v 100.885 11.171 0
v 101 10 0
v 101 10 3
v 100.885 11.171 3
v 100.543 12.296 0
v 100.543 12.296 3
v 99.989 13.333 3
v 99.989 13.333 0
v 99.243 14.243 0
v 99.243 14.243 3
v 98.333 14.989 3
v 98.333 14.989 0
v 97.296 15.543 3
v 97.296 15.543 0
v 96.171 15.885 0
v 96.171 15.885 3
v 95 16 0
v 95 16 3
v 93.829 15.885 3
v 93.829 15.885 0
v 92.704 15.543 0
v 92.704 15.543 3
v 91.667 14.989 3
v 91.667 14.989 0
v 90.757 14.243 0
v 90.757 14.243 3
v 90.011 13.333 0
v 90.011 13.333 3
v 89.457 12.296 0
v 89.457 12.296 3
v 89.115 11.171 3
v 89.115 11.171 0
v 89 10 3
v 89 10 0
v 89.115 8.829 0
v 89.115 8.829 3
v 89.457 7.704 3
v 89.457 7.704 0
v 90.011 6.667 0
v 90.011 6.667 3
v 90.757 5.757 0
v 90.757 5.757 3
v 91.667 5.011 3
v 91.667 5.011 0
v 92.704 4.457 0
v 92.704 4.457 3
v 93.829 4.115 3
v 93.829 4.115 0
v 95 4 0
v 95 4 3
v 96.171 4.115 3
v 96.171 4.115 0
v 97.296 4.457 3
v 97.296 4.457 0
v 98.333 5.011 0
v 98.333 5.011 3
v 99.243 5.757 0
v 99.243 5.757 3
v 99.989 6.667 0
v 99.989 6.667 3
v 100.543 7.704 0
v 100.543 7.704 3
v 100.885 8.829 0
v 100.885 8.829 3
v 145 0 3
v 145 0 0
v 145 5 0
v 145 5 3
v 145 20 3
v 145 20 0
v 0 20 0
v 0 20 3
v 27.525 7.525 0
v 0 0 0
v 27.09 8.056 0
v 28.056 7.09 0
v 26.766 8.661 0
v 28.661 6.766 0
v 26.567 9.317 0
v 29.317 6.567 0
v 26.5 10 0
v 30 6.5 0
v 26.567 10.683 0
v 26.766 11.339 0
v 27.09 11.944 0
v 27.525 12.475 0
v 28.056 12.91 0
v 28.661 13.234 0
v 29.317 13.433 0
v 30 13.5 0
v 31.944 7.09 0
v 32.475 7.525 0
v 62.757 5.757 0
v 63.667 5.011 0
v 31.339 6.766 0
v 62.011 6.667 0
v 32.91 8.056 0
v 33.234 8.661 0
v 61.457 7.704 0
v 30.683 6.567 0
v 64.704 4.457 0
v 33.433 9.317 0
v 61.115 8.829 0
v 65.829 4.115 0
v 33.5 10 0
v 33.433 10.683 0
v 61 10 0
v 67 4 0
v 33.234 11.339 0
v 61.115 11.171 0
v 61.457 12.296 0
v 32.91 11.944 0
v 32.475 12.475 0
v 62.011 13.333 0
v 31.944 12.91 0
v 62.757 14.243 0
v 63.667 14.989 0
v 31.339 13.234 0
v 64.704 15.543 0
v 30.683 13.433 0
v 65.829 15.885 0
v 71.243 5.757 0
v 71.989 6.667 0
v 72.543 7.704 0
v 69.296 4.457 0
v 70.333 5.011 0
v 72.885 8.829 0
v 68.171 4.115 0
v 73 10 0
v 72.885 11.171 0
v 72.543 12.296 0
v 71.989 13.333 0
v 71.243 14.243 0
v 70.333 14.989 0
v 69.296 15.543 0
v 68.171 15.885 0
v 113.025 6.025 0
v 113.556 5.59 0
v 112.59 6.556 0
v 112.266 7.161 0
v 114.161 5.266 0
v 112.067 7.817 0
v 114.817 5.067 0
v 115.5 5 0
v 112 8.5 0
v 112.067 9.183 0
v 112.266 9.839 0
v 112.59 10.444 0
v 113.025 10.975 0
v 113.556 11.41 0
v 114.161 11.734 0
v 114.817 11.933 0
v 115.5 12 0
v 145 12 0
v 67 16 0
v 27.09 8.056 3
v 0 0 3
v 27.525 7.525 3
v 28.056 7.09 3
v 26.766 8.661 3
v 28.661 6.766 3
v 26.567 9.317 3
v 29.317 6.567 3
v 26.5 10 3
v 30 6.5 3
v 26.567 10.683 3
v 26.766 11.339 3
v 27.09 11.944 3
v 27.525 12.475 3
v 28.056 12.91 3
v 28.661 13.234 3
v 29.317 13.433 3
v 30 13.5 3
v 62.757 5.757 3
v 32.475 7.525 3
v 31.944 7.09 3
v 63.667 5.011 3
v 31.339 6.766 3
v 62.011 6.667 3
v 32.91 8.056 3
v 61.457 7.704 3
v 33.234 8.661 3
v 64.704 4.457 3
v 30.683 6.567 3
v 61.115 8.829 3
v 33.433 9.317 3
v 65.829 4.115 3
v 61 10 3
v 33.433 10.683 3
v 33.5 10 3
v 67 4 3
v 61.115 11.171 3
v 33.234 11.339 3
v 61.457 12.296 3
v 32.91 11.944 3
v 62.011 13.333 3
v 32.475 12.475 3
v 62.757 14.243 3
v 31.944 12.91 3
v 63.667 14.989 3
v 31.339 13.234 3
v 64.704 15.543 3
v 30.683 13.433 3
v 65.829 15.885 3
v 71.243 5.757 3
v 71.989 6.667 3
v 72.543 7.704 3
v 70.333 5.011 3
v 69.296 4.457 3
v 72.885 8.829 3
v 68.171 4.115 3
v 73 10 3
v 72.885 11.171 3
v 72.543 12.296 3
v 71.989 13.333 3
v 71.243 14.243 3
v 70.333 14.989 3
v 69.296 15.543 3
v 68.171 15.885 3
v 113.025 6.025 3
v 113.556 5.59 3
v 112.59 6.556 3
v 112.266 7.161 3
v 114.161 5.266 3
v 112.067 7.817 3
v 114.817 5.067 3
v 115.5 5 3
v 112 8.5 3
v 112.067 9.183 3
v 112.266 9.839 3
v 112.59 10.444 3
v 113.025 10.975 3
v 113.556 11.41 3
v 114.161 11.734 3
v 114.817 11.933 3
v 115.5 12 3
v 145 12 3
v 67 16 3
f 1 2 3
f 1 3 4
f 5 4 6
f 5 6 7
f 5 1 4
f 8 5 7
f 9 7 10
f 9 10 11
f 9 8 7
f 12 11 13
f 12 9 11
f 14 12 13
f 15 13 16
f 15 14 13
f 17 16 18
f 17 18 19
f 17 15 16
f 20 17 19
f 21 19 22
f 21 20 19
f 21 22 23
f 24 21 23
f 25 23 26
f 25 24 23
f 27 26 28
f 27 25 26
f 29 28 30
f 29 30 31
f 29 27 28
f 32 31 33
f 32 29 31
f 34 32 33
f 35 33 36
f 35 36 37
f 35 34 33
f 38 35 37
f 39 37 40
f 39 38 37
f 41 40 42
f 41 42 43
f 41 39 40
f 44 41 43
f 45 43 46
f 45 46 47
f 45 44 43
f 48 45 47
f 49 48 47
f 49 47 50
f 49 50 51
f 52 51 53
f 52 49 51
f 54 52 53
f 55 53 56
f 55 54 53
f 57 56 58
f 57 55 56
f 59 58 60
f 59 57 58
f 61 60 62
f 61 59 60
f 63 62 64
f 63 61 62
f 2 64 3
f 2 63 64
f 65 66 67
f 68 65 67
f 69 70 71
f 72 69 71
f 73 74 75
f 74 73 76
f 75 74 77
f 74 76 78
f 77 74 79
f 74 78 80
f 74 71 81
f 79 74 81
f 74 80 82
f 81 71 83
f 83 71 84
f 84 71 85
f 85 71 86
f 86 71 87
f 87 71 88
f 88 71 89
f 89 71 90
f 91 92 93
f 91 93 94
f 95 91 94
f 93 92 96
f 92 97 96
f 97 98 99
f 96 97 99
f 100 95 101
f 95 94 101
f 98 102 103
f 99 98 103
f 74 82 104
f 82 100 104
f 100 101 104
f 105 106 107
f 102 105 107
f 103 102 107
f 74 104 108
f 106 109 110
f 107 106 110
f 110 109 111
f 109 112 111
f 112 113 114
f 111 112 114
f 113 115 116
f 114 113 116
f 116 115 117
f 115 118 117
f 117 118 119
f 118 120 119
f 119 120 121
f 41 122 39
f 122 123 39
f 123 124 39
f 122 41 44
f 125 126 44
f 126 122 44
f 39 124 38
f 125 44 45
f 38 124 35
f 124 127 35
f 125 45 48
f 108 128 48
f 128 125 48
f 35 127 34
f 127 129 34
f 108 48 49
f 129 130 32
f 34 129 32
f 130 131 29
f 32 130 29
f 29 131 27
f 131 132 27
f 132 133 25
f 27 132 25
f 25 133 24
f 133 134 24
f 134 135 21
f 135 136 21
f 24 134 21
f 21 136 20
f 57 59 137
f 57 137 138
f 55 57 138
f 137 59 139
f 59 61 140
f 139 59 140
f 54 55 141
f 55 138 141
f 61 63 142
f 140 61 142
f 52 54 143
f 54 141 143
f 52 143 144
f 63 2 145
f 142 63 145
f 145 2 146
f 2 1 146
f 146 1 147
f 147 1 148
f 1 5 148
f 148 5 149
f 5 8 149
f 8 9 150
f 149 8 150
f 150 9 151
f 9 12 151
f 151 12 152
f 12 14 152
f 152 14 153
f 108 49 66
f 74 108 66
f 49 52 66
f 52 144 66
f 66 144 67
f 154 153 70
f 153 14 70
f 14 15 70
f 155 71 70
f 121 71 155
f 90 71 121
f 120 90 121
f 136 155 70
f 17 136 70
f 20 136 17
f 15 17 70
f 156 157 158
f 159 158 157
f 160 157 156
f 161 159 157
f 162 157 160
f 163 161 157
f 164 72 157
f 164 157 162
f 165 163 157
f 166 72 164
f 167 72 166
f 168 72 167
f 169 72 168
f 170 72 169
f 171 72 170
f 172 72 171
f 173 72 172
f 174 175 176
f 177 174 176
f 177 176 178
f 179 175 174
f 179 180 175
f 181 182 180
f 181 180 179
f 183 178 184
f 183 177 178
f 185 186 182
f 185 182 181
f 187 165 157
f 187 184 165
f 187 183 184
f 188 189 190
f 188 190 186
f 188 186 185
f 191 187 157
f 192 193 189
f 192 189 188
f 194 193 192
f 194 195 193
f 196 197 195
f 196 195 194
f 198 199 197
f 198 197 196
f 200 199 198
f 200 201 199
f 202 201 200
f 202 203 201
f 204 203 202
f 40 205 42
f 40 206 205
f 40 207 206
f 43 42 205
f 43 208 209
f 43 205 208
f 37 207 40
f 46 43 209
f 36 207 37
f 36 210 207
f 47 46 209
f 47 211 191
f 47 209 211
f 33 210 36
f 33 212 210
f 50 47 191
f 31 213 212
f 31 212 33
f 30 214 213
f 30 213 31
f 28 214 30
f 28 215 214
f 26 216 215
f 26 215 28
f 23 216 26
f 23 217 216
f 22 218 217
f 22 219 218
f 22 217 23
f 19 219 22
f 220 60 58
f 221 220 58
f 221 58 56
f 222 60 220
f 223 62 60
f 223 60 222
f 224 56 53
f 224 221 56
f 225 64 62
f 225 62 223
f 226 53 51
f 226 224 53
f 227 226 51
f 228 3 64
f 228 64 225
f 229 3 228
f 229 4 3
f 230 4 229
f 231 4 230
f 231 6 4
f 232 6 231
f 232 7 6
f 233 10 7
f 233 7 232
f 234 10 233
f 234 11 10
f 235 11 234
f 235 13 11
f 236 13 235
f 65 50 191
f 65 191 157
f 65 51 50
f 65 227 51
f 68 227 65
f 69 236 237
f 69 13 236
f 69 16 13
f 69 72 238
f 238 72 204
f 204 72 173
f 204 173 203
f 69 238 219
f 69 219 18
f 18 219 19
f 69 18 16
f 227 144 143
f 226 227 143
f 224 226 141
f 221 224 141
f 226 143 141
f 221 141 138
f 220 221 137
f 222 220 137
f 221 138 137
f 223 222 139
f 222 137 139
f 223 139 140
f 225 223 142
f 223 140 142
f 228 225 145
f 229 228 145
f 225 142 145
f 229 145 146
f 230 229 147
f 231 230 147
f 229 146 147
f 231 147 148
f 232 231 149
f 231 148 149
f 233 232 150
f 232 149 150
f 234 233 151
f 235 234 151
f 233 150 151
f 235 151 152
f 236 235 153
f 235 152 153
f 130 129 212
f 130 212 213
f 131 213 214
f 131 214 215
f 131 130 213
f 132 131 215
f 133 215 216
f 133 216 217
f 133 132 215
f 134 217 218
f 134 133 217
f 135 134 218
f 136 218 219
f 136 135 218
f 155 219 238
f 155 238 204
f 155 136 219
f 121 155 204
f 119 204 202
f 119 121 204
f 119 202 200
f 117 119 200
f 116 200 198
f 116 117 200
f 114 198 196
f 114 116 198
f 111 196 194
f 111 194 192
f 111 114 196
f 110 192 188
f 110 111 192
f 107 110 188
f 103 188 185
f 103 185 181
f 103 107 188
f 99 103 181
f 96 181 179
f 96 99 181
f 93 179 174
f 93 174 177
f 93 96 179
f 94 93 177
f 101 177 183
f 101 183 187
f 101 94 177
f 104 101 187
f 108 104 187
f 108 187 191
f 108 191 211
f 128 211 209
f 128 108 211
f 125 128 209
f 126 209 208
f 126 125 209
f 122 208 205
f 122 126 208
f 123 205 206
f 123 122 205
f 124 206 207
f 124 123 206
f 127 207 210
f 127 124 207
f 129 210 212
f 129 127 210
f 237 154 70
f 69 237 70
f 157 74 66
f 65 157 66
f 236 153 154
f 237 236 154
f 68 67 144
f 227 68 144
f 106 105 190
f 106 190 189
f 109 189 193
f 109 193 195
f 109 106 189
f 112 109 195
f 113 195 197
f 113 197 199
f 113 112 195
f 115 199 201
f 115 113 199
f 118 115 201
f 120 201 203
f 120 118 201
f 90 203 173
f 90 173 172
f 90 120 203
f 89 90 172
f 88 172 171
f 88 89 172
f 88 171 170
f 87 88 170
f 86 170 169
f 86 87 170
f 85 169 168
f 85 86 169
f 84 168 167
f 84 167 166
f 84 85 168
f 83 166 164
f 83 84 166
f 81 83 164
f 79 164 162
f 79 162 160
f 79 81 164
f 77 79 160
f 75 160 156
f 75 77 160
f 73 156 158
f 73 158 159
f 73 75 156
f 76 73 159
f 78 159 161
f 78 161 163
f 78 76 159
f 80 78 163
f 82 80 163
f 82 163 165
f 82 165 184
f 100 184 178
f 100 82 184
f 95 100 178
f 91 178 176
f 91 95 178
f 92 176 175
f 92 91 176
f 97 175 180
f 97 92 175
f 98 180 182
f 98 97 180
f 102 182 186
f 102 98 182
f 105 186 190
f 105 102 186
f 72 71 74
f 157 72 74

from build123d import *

# Parameters (mm, degrees)
SKETCH1_R           = 3.5
SKETCH1_R_2         = 6
BOSS_EXTRUDE1_DEPTH = 3


with BuildPart() as part:
    # Sketch1 → Boss-Extrude1 (new body)
    with BuildSketch(Plane.XY):
        with BuildLine():
            Line((0, 20), (0, 0))
            Line((0, 0), (145, 0))
            Line((145, 0), (145, 5))
            Line((145, 5), (115.5, 5))
            ThreePointArc((115.5, 5), (112, 8.5), (115.5, 12))
            Line((115.5, 12), (145, 12))
            Line((145, 12), (145, 20))
            Line((145, 20), (0, 20))
        make_face()
        with Locations((30, 10)):
            Circle(SKETCH1_R, mode=Mode.SUBTRACT)
        with Locations((67, 10)):
            Circle(SKETCH1_R_2, mode=Mode.SUBTRACT)
        with Locations((95, 10)):
            Circle(SKETCH1_R_2, mode=Mode.SUBTRACT)
    extrude(amount=BOSS_EXTRUDE1_DEPTH)


solid = part.part
